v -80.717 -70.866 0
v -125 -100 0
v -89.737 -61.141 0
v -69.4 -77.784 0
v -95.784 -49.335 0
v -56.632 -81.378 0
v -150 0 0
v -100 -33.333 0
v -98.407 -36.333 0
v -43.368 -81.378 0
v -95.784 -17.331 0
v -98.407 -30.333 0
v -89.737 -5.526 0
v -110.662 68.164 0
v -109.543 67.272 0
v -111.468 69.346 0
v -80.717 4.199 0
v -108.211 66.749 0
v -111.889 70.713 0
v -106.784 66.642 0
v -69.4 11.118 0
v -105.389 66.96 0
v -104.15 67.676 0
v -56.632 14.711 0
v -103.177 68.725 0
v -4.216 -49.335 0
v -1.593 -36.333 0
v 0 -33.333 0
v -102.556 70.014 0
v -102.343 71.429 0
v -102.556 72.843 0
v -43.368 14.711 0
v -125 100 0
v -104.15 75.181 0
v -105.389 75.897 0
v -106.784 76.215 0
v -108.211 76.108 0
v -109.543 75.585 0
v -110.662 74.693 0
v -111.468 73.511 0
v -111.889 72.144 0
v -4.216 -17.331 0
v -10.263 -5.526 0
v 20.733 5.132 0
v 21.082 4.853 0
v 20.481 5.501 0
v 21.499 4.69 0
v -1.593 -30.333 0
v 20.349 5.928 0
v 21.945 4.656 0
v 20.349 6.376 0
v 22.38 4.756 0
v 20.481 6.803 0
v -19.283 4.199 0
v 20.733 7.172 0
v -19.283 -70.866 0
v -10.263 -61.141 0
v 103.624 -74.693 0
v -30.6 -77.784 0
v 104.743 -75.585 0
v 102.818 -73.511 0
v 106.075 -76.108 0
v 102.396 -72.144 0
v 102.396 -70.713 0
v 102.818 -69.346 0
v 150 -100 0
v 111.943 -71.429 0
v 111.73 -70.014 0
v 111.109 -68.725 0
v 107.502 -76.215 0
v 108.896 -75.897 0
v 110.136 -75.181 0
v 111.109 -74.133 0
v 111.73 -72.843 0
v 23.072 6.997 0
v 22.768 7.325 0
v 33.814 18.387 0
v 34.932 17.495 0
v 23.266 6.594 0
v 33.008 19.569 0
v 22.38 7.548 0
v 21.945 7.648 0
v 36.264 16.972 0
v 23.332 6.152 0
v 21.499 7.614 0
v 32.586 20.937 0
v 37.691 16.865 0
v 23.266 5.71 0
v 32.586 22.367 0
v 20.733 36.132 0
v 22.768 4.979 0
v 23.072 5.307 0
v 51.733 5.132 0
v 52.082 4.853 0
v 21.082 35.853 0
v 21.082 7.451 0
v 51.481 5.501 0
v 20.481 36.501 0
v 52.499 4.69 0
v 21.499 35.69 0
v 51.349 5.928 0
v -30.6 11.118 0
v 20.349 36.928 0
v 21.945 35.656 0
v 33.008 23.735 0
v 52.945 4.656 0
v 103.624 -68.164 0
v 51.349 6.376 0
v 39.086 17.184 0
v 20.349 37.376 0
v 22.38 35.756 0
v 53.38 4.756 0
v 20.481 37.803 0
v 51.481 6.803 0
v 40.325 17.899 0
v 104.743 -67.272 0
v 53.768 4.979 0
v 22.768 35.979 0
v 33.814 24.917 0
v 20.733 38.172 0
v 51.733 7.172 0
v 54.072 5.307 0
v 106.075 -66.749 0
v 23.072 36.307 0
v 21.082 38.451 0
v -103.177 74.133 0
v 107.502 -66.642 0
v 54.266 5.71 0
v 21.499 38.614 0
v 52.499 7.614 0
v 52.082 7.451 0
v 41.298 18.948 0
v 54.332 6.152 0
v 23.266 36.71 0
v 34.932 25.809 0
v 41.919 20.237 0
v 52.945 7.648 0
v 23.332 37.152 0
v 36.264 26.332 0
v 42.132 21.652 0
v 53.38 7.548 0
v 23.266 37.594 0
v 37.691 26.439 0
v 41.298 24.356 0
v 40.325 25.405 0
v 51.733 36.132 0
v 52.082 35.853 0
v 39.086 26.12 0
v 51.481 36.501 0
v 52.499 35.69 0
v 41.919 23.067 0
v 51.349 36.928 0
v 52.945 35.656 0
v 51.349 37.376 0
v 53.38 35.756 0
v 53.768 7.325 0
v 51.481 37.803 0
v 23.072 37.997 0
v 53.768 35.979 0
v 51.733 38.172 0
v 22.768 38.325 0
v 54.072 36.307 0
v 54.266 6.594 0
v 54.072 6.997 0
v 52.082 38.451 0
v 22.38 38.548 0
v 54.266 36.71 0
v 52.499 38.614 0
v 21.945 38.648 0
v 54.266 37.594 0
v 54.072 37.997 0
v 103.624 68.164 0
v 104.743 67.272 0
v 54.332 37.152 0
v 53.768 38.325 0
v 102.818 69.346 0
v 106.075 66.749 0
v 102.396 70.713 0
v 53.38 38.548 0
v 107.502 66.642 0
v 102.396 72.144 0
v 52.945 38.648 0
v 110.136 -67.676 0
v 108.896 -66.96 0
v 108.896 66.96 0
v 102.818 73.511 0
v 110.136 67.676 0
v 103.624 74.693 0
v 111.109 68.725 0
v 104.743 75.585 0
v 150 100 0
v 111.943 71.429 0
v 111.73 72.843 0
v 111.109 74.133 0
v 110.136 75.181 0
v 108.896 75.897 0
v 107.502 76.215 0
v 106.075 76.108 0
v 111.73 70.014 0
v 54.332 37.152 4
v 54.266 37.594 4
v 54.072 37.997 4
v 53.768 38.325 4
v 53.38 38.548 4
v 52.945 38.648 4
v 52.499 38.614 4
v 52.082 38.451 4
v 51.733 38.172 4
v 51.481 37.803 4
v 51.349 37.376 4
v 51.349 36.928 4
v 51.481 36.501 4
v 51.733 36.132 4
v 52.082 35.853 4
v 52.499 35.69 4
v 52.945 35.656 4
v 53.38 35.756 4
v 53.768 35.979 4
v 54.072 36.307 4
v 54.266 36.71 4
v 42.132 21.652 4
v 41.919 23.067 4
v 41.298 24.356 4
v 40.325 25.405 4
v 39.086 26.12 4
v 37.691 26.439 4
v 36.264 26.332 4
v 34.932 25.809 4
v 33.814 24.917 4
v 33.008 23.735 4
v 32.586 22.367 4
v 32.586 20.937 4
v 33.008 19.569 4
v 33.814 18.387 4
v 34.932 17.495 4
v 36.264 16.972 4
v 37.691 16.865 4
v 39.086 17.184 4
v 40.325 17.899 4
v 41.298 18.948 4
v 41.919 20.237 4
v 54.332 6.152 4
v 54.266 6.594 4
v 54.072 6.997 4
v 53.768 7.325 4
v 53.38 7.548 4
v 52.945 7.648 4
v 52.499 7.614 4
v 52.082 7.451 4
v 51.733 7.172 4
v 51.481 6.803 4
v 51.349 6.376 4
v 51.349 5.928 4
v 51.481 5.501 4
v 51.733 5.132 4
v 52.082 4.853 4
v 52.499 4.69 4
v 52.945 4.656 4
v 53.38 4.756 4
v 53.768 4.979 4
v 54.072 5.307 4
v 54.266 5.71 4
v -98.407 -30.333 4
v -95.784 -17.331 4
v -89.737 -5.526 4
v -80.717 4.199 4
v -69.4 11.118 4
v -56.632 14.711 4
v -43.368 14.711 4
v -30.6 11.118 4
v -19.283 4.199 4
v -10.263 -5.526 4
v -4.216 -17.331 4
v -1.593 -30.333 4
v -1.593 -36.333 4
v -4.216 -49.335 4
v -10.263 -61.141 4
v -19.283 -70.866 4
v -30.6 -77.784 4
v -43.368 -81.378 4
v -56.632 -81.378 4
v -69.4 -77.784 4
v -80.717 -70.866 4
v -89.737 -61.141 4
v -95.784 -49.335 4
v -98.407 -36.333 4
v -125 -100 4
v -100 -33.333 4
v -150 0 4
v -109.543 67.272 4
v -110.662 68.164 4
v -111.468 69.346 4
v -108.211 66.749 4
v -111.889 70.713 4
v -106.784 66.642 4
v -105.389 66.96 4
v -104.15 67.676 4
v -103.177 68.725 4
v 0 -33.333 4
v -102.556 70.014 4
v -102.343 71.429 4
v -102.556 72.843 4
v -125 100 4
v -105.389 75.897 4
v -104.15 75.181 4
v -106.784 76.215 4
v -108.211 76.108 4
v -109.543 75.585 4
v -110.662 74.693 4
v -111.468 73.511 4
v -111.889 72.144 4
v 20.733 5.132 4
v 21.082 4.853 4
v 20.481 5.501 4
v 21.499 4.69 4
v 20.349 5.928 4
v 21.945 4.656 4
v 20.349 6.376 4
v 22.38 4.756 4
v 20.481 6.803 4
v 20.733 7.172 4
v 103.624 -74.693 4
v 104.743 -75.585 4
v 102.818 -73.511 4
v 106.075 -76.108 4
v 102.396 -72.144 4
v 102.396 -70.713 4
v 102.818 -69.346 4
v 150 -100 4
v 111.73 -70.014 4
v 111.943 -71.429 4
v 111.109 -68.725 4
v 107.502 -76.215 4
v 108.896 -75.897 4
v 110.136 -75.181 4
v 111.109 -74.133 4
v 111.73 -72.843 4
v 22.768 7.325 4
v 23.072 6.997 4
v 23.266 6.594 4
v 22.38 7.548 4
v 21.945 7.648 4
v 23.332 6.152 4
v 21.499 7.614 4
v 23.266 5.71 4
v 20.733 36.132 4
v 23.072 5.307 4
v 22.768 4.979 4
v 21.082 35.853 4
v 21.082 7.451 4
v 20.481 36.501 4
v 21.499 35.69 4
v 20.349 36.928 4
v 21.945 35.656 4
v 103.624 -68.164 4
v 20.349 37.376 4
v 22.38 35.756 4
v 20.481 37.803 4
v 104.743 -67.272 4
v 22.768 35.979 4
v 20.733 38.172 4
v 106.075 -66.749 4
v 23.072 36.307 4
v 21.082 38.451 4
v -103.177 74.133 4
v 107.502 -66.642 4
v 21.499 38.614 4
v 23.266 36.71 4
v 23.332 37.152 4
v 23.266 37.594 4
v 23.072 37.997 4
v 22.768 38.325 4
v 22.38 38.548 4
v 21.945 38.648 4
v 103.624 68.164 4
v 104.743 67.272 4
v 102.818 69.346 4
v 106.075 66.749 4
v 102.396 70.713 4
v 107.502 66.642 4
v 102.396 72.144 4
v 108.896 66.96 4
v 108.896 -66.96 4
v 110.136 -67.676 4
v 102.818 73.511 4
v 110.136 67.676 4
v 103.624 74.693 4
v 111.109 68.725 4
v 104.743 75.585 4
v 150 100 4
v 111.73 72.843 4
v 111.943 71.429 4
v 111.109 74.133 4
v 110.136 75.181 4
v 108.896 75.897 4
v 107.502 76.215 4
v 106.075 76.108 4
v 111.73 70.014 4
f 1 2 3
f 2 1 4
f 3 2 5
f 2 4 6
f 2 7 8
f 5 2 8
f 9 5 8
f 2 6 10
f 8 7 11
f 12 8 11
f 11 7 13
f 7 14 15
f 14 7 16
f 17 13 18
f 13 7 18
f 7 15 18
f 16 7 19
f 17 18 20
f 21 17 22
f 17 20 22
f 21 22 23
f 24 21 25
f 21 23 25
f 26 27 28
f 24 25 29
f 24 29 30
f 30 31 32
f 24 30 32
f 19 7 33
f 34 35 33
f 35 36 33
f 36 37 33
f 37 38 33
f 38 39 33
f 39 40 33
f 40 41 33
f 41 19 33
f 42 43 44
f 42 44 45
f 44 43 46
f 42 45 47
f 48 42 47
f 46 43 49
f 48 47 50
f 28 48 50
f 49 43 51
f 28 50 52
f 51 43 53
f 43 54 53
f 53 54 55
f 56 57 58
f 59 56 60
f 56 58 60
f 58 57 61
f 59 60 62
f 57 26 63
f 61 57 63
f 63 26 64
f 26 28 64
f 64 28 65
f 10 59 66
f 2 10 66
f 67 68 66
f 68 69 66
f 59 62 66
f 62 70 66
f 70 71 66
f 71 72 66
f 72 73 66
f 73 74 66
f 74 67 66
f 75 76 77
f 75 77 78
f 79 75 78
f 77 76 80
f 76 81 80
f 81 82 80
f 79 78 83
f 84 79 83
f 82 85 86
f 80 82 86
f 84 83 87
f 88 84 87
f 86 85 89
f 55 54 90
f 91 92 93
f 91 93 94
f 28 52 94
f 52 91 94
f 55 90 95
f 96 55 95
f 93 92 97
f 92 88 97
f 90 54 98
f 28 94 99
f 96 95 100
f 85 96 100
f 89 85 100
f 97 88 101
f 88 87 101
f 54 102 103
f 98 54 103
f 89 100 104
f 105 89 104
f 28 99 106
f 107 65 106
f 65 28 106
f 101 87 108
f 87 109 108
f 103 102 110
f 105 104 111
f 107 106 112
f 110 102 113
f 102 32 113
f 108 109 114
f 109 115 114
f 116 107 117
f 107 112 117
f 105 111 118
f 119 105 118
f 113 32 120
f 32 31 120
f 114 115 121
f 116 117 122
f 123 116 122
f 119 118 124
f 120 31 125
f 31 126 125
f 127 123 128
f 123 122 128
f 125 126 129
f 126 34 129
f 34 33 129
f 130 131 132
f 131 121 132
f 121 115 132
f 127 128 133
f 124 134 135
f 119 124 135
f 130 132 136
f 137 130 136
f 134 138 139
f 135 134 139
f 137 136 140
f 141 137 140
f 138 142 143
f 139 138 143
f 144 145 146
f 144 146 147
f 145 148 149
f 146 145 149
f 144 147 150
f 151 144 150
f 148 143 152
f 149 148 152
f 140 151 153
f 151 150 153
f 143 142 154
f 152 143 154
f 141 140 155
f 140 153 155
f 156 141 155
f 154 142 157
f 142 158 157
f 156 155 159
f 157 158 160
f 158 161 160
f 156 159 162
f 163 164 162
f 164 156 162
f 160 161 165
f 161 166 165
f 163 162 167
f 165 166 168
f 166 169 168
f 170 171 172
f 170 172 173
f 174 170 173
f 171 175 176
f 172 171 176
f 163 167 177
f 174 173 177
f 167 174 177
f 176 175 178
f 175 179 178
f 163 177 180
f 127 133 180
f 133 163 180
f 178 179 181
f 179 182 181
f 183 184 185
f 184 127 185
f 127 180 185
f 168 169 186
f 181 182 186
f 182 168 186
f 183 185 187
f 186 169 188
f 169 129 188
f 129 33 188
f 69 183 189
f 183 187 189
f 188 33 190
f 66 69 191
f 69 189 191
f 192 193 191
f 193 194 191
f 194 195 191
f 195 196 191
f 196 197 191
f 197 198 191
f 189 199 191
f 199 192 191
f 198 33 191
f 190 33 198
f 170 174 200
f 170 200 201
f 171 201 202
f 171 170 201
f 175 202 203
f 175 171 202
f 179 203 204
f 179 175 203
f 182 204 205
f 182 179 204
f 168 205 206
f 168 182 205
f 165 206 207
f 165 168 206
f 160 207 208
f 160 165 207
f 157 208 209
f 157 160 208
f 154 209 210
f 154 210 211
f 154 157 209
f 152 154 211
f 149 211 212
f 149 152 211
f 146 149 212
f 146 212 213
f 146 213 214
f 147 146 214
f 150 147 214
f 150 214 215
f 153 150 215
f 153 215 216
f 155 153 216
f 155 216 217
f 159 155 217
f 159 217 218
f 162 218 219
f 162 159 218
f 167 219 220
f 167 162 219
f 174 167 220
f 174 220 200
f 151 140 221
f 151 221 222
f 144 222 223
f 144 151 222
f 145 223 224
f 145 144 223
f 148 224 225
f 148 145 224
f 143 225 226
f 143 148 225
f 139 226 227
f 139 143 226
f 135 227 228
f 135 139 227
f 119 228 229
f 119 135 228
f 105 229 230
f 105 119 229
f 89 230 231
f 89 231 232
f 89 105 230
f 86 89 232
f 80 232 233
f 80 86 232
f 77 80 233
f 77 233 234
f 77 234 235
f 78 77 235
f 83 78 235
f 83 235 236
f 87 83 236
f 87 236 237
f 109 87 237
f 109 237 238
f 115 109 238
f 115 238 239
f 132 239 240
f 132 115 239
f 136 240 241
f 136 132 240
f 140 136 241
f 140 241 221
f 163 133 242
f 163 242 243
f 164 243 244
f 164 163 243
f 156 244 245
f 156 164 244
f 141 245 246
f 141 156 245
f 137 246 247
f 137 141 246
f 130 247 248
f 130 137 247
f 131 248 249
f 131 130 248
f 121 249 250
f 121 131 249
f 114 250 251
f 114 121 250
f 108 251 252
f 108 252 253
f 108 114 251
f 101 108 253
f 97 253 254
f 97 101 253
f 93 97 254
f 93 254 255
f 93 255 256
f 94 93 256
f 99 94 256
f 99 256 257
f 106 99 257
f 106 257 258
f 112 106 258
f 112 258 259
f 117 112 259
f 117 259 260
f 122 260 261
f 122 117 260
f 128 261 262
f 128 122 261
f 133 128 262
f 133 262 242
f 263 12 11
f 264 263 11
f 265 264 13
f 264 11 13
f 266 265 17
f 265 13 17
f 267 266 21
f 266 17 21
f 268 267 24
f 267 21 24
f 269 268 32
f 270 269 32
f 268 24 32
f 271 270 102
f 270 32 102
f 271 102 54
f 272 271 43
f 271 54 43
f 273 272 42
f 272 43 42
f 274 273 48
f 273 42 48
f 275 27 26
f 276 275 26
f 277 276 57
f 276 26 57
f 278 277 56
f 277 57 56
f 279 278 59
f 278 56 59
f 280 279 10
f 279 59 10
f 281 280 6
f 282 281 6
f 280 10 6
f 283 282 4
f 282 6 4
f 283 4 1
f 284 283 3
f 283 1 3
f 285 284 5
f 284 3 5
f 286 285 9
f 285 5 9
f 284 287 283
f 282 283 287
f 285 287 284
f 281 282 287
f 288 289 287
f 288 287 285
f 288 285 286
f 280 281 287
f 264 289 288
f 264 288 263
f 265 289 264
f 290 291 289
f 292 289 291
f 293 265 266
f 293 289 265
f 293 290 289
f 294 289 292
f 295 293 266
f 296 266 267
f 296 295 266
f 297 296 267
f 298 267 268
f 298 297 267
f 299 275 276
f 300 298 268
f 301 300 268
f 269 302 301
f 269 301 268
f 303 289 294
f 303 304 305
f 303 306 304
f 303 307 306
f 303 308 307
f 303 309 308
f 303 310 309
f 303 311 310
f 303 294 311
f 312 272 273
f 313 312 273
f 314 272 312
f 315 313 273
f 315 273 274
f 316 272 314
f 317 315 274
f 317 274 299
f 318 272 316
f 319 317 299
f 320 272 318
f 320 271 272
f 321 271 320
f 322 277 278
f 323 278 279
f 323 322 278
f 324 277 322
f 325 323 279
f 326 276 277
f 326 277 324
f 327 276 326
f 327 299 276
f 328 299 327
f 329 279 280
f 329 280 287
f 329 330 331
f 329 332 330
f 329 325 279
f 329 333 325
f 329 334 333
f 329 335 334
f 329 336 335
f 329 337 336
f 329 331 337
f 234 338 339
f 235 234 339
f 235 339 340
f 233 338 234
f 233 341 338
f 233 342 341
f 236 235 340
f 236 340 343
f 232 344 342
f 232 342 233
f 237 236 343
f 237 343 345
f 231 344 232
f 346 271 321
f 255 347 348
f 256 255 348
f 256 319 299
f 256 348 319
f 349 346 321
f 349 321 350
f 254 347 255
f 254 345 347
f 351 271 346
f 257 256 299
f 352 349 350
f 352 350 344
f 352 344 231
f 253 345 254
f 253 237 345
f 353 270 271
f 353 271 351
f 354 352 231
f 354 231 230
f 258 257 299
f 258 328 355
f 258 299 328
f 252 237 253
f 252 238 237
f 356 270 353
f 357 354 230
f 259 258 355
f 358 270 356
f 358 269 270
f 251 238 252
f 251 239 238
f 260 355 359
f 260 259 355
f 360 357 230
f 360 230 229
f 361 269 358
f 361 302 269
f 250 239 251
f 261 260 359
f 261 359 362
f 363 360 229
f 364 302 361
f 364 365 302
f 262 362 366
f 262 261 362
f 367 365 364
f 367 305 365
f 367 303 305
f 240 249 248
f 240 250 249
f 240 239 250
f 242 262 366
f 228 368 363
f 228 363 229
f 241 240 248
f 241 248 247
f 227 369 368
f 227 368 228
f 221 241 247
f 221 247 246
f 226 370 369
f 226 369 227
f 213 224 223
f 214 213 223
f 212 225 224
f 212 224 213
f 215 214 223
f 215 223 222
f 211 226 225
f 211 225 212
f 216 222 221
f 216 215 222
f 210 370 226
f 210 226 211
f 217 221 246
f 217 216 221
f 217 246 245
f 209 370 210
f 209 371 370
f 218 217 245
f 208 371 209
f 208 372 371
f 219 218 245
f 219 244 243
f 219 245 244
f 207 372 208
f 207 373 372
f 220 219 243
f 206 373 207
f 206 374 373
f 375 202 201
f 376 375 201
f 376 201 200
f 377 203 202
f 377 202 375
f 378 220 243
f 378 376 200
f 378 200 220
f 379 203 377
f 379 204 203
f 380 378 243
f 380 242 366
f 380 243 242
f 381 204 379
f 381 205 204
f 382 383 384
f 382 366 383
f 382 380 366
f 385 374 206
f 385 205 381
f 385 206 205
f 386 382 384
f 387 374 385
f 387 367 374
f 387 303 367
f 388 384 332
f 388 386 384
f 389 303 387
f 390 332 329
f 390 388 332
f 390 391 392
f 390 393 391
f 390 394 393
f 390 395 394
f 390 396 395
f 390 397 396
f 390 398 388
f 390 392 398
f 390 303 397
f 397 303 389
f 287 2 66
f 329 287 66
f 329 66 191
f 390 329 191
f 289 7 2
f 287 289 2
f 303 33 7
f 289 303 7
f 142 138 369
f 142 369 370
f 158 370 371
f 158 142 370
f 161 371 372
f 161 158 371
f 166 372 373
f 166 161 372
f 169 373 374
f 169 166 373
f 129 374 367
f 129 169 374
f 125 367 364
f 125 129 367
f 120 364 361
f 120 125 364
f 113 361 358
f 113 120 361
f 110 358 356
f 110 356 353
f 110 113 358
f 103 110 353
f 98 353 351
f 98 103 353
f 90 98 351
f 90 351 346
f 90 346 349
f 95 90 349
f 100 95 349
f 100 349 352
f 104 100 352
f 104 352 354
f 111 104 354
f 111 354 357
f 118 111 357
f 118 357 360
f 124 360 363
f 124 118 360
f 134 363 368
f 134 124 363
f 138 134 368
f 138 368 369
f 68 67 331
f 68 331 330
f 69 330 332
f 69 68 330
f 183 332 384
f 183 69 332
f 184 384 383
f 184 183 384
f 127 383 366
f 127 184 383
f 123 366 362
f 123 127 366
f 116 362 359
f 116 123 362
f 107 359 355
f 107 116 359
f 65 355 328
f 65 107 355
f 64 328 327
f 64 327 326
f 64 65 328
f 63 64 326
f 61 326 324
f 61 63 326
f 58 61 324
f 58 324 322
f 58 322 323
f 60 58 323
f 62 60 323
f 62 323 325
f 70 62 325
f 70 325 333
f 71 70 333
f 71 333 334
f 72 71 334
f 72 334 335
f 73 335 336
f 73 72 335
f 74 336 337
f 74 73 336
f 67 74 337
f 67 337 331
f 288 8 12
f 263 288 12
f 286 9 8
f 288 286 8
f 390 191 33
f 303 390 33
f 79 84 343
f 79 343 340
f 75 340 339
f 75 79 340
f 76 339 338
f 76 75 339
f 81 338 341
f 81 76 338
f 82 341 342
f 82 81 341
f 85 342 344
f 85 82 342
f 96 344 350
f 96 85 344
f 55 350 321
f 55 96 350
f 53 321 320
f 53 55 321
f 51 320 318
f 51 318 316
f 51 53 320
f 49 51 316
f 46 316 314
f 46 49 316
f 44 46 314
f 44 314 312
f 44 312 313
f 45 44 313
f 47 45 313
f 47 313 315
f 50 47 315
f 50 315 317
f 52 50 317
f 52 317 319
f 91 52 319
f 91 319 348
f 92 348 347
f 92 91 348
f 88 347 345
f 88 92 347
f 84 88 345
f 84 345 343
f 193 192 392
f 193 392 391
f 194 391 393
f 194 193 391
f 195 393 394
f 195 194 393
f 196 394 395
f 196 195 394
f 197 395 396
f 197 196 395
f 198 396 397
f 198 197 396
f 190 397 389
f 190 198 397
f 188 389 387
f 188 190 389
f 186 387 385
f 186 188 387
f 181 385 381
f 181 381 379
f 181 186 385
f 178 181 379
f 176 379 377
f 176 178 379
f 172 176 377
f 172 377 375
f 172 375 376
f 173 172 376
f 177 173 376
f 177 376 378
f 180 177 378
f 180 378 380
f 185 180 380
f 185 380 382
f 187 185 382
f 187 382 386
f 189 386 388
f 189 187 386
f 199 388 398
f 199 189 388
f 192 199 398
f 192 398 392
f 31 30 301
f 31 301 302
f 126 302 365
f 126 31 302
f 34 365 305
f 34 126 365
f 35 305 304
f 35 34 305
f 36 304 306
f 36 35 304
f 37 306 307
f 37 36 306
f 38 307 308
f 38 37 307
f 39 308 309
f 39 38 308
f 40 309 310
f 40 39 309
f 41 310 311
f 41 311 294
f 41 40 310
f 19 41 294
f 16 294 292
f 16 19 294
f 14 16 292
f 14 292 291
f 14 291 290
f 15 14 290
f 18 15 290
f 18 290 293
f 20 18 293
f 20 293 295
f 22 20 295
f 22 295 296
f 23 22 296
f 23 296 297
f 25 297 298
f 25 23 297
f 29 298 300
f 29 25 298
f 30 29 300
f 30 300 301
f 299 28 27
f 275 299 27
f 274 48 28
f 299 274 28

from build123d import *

# Parameters (mm, degrees)
SKETCH1_R           = 4.8
SKETCH1_R_2         = 1.5
BOSS_EXTRUDE3_DEPTH = 4


with BuildPart() as part:
    # Sketch1 → Boss-Extrude3 (new body)
    with BuildSketch(Plane.XY):
        Polygon((-125, -100), (150, -100), (150, 100), (-125, 100), (-150, 0), align=None)
        with BuildLine():
            Line((0, -33.333333333), (-1.592872426, -36.333333333))
            ThreePointArc((-1.592872426, -36.333333333), (-50, -81.833333333), (-98.407127574, -36.333333333))
            Line((-98.407127574, -36.333333333), (-100, -33.333333333))
            Line((-100, -33.333333333), (-98.407127574, -30.333333333))
            ThreePointArc((-98.407127574, -30.333333333), (-50, 15.166666667), (-1.592872426, -30.333333333))
            Line((-1.592872426, -30.333333333), (0, -33.333333333))
        make_face(mode=Mode.SUBTRACT)
        with Locations((107.142857143, -71.428571429)):
            Circle(SKETCH1_R, mode=Mode.SUBTRACT)
        with Locations((-107.142857143, 71.428571429)):
            Circle(SKETCH1_R, mode=Mode.SUBTRACT)
        with Locations((21.832408692, 6.152026506)):
            Circle(SKETCH1_R_2, mode=Mode.SUBTRACT)
        with Locations((37.332408692, 21.652026506)):
            Circle(SKETCH1_R, mode=Mode.SUBTRACT)
        with Locations((52.832408692, 6.152026506)):
            Circle(SKETCH1_R_2, mode=Mode.SUBTRACT)
        with Locations((21.832408692, 37.152026506)):
            Circle(SKETCH1_R_2, mode=Mode.SUBTRACT)
        with Locations((52.832408692, 37.152026506)):
            Circle(SKETCH1_R_2, mode=Mode.SUBTRACT)
        with Locations((107.142857143, 71.428571429)):
            Circle(SKETCH1_R, mode=Mode.SUBTRACT)
    extrude(amount=BOSS_EXTRUDE3_DEPTH)


solid = part.part
